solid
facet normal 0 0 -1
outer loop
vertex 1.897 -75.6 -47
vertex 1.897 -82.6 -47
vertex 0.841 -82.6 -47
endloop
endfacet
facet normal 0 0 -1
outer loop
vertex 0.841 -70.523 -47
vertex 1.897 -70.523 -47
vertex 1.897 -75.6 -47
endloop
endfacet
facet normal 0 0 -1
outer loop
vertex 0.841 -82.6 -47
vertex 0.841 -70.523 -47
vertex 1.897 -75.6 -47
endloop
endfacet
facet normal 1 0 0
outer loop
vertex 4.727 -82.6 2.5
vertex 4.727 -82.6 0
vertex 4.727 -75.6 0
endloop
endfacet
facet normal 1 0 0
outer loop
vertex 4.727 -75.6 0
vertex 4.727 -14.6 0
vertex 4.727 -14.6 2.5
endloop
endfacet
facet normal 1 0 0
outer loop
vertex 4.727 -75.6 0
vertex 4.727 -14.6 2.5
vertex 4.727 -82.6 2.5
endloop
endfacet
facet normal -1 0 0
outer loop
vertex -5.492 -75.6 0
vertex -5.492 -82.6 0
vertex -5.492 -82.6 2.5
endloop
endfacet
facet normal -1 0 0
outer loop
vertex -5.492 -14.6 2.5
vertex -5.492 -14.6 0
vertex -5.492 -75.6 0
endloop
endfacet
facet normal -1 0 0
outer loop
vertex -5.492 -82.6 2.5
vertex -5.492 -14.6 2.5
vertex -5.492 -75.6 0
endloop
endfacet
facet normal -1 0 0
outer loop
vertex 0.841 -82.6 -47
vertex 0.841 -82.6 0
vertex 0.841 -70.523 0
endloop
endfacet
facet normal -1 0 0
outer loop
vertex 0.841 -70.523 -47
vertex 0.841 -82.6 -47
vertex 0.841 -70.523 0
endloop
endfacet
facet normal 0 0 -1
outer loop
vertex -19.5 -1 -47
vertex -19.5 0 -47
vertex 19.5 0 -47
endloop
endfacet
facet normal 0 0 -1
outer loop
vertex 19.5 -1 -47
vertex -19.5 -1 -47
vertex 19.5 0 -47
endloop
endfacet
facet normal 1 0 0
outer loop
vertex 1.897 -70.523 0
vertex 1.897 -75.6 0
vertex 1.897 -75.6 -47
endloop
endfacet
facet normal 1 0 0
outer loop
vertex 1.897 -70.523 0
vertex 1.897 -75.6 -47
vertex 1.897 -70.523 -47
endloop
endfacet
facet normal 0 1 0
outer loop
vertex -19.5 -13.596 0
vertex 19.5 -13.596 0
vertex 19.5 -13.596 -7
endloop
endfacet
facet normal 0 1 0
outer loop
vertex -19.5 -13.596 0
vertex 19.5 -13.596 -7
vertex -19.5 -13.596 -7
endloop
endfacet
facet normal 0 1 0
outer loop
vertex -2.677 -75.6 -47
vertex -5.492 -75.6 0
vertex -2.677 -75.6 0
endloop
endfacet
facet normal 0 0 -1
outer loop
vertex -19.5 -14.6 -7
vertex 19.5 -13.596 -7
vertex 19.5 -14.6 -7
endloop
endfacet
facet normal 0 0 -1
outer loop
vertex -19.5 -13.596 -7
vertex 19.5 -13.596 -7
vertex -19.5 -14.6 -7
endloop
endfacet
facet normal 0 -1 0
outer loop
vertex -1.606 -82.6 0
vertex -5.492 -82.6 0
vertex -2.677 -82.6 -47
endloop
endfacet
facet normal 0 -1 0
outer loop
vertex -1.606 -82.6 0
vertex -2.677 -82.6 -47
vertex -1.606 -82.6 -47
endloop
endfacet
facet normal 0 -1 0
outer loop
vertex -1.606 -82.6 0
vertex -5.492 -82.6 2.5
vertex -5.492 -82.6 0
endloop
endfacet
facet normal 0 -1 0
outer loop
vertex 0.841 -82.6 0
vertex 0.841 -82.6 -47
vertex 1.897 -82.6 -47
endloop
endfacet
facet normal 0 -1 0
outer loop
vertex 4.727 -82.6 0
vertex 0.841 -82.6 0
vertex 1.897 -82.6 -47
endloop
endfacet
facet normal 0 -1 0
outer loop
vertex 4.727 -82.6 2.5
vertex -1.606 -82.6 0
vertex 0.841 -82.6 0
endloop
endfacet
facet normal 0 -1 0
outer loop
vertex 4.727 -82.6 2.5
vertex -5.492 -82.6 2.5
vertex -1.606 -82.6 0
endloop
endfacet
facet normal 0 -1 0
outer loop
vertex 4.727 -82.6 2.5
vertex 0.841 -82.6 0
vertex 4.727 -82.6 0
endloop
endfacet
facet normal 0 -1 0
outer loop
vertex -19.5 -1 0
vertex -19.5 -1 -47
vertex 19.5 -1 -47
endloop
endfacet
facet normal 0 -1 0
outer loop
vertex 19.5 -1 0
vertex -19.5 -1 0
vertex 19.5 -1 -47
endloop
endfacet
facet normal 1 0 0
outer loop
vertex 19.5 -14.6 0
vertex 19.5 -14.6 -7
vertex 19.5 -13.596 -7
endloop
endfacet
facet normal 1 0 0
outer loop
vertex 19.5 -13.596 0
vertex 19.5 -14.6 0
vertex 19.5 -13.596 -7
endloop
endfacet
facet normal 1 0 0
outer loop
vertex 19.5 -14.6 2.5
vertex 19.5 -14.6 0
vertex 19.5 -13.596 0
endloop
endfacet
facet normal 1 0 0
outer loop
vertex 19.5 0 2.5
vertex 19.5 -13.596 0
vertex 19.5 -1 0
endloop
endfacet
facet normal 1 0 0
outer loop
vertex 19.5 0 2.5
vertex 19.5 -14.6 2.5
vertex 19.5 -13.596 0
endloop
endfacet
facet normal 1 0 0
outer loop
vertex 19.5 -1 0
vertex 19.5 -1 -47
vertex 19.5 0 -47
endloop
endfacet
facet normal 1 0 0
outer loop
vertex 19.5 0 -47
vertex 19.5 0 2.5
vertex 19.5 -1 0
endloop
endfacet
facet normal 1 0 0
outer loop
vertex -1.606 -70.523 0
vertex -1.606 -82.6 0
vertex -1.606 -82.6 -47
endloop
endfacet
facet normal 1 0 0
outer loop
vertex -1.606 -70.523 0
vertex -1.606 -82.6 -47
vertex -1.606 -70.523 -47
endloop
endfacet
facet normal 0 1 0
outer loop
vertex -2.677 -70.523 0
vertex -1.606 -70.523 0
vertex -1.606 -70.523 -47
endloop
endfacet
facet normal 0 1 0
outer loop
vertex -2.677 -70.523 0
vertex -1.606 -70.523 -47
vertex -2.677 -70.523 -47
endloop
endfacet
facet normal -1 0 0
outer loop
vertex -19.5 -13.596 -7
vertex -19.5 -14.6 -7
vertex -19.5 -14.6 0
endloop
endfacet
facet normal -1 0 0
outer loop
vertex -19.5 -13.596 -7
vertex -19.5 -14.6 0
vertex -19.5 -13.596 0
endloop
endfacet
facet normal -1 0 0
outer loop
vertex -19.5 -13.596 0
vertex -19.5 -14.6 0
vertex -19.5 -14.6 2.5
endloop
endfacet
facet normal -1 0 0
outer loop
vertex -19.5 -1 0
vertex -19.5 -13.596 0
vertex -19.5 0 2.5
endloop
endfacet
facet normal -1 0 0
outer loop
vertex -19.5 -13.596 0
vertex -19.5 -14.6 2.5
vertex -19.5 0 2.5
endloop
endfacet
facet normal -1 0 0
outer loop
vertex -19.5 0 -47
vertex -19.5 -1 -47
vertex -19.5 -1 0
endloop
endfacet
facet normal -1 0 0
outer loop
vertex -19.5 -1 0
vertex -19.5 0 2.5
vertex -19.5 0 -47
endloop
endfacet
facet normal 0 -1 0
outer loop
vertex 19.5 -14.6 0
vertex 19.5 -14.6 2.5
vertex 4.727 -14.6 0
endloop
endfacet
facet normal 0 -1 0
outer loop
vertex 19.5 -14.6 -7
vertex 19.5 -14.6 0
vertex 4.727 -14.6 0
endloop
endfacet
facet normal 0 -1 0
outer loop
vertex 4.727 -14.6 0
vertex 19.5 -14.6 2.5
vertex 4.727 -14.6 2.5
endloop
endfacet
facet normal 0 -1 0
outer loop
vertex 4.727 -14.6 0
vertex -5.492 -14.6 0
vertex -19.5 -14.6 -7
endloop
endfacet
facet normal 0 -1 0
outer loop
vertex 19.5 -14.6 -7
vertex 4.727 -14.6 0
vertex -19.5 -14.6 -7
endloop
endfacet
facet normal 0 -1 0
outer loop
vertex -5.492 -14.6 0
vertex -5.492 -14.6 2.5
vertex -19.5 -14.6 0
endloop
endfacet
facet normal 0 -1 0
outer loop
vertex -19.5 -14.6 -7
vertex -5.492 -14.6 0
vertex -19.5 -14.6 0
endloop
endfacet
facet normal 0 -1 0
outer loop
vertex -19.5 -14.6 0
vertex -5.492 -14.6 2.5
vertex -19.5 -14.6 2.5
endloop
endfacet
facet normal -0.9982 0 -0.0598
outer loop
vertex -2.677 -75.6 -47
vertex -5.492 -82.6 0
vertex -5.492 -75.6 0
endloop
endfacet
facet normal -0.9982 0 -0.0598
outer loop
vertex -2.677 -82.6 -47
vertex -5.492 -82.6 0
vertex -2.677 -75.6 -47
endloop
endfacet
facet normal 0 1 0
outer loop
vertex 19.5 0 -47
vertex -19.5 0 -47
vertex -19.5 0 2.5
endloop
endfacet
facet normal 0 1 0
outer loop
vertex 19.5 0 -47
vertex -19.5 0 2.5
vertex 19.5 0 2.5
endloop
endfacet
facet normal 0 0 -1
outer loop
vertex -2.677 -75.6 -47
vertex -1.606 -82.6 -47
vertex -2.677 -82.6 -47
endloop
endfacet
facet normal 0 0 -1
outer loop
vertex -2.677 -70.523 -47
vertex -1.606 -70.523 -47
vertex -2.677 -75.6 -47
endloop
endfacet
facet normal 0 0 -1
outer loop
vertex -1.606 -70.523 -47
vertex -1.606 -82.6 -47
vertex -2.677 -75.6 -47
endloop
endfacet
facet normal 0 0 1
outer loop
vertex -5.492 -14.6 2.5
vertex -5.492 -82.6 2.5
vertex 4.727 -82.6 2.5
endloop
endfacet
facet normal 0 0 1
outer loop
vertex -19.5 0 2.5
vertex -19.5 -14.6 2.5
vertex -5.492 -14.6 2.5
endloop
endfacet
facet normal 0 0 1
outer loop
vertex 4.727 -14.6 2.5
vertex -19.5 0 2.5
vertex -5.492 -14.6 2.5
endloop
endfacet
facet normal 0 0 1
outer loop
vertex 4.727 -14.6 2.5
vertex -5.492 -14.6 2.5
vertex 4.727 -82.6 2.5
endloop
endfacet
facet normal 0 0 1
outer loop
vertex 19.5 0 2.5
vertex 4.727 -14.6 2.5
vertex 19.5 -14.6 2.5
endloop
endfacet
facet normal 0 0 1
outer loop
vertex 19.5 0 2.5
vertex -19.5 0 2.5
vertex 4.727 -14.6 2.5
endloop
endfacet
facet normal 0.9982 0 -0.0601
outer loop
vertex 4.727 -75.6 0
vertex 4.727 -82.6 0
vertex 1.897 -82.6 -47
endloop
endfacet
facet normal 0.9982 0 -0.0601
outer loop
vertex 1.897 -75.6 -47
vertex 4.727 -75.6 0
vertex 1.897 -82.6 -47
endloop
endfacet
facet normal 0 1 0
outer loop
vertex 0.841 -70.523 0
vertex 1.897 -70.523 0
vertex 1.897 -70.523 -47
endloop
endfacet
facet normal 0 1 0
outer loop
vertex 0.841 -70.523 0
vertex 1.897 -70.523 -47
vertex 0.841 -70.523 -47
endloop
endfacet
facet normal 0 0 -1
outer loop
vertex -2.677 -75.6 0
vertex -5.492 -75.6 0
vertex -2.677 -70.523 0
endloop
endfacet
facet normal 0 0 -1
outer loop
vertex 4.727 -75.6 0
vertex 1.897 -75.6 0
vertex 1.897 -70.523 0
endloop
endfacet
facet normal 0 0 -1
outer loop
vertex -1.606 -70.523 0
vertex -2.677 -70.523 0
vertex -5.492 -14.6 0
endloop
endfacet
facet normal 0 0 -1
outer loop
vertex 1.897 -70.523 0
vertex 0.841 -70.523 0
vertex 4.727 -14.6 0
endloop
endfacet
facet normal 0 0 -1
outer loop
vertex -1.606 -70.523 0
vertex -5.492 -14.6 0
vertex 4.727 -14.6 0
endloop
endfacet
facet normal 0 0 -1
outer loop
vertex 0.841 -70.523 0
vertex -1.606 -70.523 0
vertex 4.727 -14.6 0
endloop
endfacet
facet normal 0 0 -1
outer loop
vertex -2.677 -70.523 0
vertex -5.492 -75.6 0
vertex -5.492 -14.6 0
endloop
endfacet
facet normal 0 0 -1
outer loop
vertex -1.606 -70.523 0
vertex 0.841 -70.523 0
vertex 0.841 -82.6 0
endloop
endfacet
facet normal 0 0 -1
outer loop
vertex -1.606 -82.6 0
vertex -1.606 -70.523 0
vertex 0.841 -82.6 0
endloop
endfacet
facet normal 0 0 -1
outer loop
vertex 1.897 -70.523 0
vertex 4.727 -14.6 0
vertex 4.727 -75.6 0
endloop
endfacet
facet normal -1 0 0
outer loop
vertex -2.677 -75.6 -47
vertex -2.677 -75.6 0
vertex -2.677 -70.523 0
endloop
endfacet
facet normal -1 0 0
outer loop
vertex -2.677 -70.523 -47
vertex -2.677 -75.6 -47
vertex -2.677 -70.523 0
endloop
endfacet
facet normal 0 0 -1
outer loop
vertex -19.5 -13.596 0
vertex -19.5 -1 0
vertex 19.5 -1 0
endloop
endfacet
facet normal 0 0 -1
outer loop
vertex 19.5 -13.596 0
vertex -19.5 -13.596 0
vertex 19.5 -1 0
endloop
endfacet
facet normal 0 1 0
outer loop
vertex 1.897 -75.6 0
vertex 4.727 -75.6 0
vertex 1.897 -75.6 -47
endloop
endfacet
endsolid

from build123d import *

# Parameters (mm, degrees)
EXTRUDE_1_DEPTH      = 1
EXTRUDE_2_DEPTH      = 2.5
EXTRUDE_2_DEPTH_BACK = 47
SKETCH_2_W           = 39
SKETCH_2_H           = 1
SKETCH_3_W           = 39
SKETCH_3_H           = 2.5
EXTRUDE_3_DEPTH      = 12.6
SKETCH_5_W           = 39
SKETCH_5_H           = 2.5
EXTRUDE_4_DEPTH      = 1
SKETCH_6_W           = 39
SKETCH_6_H           = 1.003738559
EXTRUDE_5_DEPTH      = 7
SKETCH_7_W           = 10.218852435
SKETCH_7_H           = 2.5
EXTRUDE_6_DEPTH      = 60
SKETCH_8_W           = 10.218852435
SKETCH_8_H           = 2.5
EXTRUDE_7_DEPTH      = 8
SKETCH_9_W           = 1.056054664
SKETCH_9_H           = 12.077363823
SKETCH_9_W_2         = 1.071222475
EXTRUDE_8_DEPTH      = 47
EXTRUDE_9_DEPTH      = 7


with BuildPart() as part:
    # 草圖1 → 填料-伸長1 (new body)
    with BuildSketch(Plane(origin=(0, 0, 0), x_dir=(1, 0, 0), z_dir=(0, 1, 0))):
        Polygon((-19.5, 0), (19.5, 0), (19.5, 7.09904377), (-12.701429462, 7.09904377), (-19.5, 10.228453209), align=None)
    extrude(amount=-EXTRUDE_1_DEPTH)

    # 草圖2 → 填料-伸長2 (add, two sides: drawn at the far end of the back side and taken through both)
    with BuildSketch(Plane.XY.offset(-EXTRUDE_2_DEPTH_BACK)):
        with Locations((0, -0.5)):
            Rectangle(SKETCH_2_W, SKETCH_2_H)
    extrude(amount=EXTRUDE_2_DEPTH + EXTRUDE_2_DEPTH_BACK)

    # 草圖3 → 填料-伸長3 (add)
    with BuildSketch(Plane.XZ.offset(1)):
        with Locations((0, 1.25)):
            Rectangle(SKETCH_3_W, SKETCH_3_H)
    extrude(amount=EXTRUDE_3_DEPTH)

    # 草圖5 → 填料-伸長4 (add)
    with BuildSketch(Plane.XZ.offset(13.6)):
        with Locations((0, 1.25)):
            Rectangle(SKETCH_5_W, SKETCH_5_H)
    extrude(amount=EXTRUDE_4_DEPTH)

    # 草圖6 → 填料-伸長5 (add)
    with BuildSketch(Plane(origin=(0, 0, 0), x_dir=(-1, 0, 0), z_dir=(0, 0, -1))):
        with Locations((0, -14.098130721)):
            Rectangle(SKETCH_6_W, SKETCH_6_H)
    extrude(amount=EXTRUDE_5_DEPTH)

    # 草圖7 → 填料-伸長6 (add)
    with BuildSketch(Plane.XZ.offset(14.6)):
        with Locations((-0.382201174, 1.25)):
            Rectangle(SKETCH_7_W, SKETCH_7_H)
    extrude(amount=EXTRUDE_6_DEPTH)

    # 草圖8 → 填料-伸長7 (add)
    with BuildSketch(Plane.XZ.offset(74.6)):
        with Locations((-0.382201174, 1.25)):
            Rectangle(SKETCH_8_W, SKETCH_8_H)
    extrude(amount=EXTRUDE_7_DEPTH)

    # 草圖9 → 填料-伸長8 (add)
    with BuildSketch(Plane(origin=(0, 0, 0), x_dir=(-1, 0, 0), z_dir=(0, 0, -1))):
        with Locations((-1.369349297, -76.561318089)):
            Rectangle(SKETCH_9_W, SKETCH_9_H)
        with Locations((2.14133555, -76.561318089)):
            Rectangle(SKETCH_9_W_2, SKETCH_9_H)
    extrude(amount=EXTRUDE_8_DEPTH)

    # 草圖10 → 填料-伸長9 (add)
    with BuildSketch(Plane.XZ.offset(82.6)):
        Polygon((-5.491627391, 0), (-2.676946787, -47), (-2.676946787, 0), align=None)
        Polygon((1.897376629, 0), (4.727225044, 0), (1.897376629, -47), align=None)
    extrude(amount=-EXTRUDE_9_DEPTH)


solid = part.part
